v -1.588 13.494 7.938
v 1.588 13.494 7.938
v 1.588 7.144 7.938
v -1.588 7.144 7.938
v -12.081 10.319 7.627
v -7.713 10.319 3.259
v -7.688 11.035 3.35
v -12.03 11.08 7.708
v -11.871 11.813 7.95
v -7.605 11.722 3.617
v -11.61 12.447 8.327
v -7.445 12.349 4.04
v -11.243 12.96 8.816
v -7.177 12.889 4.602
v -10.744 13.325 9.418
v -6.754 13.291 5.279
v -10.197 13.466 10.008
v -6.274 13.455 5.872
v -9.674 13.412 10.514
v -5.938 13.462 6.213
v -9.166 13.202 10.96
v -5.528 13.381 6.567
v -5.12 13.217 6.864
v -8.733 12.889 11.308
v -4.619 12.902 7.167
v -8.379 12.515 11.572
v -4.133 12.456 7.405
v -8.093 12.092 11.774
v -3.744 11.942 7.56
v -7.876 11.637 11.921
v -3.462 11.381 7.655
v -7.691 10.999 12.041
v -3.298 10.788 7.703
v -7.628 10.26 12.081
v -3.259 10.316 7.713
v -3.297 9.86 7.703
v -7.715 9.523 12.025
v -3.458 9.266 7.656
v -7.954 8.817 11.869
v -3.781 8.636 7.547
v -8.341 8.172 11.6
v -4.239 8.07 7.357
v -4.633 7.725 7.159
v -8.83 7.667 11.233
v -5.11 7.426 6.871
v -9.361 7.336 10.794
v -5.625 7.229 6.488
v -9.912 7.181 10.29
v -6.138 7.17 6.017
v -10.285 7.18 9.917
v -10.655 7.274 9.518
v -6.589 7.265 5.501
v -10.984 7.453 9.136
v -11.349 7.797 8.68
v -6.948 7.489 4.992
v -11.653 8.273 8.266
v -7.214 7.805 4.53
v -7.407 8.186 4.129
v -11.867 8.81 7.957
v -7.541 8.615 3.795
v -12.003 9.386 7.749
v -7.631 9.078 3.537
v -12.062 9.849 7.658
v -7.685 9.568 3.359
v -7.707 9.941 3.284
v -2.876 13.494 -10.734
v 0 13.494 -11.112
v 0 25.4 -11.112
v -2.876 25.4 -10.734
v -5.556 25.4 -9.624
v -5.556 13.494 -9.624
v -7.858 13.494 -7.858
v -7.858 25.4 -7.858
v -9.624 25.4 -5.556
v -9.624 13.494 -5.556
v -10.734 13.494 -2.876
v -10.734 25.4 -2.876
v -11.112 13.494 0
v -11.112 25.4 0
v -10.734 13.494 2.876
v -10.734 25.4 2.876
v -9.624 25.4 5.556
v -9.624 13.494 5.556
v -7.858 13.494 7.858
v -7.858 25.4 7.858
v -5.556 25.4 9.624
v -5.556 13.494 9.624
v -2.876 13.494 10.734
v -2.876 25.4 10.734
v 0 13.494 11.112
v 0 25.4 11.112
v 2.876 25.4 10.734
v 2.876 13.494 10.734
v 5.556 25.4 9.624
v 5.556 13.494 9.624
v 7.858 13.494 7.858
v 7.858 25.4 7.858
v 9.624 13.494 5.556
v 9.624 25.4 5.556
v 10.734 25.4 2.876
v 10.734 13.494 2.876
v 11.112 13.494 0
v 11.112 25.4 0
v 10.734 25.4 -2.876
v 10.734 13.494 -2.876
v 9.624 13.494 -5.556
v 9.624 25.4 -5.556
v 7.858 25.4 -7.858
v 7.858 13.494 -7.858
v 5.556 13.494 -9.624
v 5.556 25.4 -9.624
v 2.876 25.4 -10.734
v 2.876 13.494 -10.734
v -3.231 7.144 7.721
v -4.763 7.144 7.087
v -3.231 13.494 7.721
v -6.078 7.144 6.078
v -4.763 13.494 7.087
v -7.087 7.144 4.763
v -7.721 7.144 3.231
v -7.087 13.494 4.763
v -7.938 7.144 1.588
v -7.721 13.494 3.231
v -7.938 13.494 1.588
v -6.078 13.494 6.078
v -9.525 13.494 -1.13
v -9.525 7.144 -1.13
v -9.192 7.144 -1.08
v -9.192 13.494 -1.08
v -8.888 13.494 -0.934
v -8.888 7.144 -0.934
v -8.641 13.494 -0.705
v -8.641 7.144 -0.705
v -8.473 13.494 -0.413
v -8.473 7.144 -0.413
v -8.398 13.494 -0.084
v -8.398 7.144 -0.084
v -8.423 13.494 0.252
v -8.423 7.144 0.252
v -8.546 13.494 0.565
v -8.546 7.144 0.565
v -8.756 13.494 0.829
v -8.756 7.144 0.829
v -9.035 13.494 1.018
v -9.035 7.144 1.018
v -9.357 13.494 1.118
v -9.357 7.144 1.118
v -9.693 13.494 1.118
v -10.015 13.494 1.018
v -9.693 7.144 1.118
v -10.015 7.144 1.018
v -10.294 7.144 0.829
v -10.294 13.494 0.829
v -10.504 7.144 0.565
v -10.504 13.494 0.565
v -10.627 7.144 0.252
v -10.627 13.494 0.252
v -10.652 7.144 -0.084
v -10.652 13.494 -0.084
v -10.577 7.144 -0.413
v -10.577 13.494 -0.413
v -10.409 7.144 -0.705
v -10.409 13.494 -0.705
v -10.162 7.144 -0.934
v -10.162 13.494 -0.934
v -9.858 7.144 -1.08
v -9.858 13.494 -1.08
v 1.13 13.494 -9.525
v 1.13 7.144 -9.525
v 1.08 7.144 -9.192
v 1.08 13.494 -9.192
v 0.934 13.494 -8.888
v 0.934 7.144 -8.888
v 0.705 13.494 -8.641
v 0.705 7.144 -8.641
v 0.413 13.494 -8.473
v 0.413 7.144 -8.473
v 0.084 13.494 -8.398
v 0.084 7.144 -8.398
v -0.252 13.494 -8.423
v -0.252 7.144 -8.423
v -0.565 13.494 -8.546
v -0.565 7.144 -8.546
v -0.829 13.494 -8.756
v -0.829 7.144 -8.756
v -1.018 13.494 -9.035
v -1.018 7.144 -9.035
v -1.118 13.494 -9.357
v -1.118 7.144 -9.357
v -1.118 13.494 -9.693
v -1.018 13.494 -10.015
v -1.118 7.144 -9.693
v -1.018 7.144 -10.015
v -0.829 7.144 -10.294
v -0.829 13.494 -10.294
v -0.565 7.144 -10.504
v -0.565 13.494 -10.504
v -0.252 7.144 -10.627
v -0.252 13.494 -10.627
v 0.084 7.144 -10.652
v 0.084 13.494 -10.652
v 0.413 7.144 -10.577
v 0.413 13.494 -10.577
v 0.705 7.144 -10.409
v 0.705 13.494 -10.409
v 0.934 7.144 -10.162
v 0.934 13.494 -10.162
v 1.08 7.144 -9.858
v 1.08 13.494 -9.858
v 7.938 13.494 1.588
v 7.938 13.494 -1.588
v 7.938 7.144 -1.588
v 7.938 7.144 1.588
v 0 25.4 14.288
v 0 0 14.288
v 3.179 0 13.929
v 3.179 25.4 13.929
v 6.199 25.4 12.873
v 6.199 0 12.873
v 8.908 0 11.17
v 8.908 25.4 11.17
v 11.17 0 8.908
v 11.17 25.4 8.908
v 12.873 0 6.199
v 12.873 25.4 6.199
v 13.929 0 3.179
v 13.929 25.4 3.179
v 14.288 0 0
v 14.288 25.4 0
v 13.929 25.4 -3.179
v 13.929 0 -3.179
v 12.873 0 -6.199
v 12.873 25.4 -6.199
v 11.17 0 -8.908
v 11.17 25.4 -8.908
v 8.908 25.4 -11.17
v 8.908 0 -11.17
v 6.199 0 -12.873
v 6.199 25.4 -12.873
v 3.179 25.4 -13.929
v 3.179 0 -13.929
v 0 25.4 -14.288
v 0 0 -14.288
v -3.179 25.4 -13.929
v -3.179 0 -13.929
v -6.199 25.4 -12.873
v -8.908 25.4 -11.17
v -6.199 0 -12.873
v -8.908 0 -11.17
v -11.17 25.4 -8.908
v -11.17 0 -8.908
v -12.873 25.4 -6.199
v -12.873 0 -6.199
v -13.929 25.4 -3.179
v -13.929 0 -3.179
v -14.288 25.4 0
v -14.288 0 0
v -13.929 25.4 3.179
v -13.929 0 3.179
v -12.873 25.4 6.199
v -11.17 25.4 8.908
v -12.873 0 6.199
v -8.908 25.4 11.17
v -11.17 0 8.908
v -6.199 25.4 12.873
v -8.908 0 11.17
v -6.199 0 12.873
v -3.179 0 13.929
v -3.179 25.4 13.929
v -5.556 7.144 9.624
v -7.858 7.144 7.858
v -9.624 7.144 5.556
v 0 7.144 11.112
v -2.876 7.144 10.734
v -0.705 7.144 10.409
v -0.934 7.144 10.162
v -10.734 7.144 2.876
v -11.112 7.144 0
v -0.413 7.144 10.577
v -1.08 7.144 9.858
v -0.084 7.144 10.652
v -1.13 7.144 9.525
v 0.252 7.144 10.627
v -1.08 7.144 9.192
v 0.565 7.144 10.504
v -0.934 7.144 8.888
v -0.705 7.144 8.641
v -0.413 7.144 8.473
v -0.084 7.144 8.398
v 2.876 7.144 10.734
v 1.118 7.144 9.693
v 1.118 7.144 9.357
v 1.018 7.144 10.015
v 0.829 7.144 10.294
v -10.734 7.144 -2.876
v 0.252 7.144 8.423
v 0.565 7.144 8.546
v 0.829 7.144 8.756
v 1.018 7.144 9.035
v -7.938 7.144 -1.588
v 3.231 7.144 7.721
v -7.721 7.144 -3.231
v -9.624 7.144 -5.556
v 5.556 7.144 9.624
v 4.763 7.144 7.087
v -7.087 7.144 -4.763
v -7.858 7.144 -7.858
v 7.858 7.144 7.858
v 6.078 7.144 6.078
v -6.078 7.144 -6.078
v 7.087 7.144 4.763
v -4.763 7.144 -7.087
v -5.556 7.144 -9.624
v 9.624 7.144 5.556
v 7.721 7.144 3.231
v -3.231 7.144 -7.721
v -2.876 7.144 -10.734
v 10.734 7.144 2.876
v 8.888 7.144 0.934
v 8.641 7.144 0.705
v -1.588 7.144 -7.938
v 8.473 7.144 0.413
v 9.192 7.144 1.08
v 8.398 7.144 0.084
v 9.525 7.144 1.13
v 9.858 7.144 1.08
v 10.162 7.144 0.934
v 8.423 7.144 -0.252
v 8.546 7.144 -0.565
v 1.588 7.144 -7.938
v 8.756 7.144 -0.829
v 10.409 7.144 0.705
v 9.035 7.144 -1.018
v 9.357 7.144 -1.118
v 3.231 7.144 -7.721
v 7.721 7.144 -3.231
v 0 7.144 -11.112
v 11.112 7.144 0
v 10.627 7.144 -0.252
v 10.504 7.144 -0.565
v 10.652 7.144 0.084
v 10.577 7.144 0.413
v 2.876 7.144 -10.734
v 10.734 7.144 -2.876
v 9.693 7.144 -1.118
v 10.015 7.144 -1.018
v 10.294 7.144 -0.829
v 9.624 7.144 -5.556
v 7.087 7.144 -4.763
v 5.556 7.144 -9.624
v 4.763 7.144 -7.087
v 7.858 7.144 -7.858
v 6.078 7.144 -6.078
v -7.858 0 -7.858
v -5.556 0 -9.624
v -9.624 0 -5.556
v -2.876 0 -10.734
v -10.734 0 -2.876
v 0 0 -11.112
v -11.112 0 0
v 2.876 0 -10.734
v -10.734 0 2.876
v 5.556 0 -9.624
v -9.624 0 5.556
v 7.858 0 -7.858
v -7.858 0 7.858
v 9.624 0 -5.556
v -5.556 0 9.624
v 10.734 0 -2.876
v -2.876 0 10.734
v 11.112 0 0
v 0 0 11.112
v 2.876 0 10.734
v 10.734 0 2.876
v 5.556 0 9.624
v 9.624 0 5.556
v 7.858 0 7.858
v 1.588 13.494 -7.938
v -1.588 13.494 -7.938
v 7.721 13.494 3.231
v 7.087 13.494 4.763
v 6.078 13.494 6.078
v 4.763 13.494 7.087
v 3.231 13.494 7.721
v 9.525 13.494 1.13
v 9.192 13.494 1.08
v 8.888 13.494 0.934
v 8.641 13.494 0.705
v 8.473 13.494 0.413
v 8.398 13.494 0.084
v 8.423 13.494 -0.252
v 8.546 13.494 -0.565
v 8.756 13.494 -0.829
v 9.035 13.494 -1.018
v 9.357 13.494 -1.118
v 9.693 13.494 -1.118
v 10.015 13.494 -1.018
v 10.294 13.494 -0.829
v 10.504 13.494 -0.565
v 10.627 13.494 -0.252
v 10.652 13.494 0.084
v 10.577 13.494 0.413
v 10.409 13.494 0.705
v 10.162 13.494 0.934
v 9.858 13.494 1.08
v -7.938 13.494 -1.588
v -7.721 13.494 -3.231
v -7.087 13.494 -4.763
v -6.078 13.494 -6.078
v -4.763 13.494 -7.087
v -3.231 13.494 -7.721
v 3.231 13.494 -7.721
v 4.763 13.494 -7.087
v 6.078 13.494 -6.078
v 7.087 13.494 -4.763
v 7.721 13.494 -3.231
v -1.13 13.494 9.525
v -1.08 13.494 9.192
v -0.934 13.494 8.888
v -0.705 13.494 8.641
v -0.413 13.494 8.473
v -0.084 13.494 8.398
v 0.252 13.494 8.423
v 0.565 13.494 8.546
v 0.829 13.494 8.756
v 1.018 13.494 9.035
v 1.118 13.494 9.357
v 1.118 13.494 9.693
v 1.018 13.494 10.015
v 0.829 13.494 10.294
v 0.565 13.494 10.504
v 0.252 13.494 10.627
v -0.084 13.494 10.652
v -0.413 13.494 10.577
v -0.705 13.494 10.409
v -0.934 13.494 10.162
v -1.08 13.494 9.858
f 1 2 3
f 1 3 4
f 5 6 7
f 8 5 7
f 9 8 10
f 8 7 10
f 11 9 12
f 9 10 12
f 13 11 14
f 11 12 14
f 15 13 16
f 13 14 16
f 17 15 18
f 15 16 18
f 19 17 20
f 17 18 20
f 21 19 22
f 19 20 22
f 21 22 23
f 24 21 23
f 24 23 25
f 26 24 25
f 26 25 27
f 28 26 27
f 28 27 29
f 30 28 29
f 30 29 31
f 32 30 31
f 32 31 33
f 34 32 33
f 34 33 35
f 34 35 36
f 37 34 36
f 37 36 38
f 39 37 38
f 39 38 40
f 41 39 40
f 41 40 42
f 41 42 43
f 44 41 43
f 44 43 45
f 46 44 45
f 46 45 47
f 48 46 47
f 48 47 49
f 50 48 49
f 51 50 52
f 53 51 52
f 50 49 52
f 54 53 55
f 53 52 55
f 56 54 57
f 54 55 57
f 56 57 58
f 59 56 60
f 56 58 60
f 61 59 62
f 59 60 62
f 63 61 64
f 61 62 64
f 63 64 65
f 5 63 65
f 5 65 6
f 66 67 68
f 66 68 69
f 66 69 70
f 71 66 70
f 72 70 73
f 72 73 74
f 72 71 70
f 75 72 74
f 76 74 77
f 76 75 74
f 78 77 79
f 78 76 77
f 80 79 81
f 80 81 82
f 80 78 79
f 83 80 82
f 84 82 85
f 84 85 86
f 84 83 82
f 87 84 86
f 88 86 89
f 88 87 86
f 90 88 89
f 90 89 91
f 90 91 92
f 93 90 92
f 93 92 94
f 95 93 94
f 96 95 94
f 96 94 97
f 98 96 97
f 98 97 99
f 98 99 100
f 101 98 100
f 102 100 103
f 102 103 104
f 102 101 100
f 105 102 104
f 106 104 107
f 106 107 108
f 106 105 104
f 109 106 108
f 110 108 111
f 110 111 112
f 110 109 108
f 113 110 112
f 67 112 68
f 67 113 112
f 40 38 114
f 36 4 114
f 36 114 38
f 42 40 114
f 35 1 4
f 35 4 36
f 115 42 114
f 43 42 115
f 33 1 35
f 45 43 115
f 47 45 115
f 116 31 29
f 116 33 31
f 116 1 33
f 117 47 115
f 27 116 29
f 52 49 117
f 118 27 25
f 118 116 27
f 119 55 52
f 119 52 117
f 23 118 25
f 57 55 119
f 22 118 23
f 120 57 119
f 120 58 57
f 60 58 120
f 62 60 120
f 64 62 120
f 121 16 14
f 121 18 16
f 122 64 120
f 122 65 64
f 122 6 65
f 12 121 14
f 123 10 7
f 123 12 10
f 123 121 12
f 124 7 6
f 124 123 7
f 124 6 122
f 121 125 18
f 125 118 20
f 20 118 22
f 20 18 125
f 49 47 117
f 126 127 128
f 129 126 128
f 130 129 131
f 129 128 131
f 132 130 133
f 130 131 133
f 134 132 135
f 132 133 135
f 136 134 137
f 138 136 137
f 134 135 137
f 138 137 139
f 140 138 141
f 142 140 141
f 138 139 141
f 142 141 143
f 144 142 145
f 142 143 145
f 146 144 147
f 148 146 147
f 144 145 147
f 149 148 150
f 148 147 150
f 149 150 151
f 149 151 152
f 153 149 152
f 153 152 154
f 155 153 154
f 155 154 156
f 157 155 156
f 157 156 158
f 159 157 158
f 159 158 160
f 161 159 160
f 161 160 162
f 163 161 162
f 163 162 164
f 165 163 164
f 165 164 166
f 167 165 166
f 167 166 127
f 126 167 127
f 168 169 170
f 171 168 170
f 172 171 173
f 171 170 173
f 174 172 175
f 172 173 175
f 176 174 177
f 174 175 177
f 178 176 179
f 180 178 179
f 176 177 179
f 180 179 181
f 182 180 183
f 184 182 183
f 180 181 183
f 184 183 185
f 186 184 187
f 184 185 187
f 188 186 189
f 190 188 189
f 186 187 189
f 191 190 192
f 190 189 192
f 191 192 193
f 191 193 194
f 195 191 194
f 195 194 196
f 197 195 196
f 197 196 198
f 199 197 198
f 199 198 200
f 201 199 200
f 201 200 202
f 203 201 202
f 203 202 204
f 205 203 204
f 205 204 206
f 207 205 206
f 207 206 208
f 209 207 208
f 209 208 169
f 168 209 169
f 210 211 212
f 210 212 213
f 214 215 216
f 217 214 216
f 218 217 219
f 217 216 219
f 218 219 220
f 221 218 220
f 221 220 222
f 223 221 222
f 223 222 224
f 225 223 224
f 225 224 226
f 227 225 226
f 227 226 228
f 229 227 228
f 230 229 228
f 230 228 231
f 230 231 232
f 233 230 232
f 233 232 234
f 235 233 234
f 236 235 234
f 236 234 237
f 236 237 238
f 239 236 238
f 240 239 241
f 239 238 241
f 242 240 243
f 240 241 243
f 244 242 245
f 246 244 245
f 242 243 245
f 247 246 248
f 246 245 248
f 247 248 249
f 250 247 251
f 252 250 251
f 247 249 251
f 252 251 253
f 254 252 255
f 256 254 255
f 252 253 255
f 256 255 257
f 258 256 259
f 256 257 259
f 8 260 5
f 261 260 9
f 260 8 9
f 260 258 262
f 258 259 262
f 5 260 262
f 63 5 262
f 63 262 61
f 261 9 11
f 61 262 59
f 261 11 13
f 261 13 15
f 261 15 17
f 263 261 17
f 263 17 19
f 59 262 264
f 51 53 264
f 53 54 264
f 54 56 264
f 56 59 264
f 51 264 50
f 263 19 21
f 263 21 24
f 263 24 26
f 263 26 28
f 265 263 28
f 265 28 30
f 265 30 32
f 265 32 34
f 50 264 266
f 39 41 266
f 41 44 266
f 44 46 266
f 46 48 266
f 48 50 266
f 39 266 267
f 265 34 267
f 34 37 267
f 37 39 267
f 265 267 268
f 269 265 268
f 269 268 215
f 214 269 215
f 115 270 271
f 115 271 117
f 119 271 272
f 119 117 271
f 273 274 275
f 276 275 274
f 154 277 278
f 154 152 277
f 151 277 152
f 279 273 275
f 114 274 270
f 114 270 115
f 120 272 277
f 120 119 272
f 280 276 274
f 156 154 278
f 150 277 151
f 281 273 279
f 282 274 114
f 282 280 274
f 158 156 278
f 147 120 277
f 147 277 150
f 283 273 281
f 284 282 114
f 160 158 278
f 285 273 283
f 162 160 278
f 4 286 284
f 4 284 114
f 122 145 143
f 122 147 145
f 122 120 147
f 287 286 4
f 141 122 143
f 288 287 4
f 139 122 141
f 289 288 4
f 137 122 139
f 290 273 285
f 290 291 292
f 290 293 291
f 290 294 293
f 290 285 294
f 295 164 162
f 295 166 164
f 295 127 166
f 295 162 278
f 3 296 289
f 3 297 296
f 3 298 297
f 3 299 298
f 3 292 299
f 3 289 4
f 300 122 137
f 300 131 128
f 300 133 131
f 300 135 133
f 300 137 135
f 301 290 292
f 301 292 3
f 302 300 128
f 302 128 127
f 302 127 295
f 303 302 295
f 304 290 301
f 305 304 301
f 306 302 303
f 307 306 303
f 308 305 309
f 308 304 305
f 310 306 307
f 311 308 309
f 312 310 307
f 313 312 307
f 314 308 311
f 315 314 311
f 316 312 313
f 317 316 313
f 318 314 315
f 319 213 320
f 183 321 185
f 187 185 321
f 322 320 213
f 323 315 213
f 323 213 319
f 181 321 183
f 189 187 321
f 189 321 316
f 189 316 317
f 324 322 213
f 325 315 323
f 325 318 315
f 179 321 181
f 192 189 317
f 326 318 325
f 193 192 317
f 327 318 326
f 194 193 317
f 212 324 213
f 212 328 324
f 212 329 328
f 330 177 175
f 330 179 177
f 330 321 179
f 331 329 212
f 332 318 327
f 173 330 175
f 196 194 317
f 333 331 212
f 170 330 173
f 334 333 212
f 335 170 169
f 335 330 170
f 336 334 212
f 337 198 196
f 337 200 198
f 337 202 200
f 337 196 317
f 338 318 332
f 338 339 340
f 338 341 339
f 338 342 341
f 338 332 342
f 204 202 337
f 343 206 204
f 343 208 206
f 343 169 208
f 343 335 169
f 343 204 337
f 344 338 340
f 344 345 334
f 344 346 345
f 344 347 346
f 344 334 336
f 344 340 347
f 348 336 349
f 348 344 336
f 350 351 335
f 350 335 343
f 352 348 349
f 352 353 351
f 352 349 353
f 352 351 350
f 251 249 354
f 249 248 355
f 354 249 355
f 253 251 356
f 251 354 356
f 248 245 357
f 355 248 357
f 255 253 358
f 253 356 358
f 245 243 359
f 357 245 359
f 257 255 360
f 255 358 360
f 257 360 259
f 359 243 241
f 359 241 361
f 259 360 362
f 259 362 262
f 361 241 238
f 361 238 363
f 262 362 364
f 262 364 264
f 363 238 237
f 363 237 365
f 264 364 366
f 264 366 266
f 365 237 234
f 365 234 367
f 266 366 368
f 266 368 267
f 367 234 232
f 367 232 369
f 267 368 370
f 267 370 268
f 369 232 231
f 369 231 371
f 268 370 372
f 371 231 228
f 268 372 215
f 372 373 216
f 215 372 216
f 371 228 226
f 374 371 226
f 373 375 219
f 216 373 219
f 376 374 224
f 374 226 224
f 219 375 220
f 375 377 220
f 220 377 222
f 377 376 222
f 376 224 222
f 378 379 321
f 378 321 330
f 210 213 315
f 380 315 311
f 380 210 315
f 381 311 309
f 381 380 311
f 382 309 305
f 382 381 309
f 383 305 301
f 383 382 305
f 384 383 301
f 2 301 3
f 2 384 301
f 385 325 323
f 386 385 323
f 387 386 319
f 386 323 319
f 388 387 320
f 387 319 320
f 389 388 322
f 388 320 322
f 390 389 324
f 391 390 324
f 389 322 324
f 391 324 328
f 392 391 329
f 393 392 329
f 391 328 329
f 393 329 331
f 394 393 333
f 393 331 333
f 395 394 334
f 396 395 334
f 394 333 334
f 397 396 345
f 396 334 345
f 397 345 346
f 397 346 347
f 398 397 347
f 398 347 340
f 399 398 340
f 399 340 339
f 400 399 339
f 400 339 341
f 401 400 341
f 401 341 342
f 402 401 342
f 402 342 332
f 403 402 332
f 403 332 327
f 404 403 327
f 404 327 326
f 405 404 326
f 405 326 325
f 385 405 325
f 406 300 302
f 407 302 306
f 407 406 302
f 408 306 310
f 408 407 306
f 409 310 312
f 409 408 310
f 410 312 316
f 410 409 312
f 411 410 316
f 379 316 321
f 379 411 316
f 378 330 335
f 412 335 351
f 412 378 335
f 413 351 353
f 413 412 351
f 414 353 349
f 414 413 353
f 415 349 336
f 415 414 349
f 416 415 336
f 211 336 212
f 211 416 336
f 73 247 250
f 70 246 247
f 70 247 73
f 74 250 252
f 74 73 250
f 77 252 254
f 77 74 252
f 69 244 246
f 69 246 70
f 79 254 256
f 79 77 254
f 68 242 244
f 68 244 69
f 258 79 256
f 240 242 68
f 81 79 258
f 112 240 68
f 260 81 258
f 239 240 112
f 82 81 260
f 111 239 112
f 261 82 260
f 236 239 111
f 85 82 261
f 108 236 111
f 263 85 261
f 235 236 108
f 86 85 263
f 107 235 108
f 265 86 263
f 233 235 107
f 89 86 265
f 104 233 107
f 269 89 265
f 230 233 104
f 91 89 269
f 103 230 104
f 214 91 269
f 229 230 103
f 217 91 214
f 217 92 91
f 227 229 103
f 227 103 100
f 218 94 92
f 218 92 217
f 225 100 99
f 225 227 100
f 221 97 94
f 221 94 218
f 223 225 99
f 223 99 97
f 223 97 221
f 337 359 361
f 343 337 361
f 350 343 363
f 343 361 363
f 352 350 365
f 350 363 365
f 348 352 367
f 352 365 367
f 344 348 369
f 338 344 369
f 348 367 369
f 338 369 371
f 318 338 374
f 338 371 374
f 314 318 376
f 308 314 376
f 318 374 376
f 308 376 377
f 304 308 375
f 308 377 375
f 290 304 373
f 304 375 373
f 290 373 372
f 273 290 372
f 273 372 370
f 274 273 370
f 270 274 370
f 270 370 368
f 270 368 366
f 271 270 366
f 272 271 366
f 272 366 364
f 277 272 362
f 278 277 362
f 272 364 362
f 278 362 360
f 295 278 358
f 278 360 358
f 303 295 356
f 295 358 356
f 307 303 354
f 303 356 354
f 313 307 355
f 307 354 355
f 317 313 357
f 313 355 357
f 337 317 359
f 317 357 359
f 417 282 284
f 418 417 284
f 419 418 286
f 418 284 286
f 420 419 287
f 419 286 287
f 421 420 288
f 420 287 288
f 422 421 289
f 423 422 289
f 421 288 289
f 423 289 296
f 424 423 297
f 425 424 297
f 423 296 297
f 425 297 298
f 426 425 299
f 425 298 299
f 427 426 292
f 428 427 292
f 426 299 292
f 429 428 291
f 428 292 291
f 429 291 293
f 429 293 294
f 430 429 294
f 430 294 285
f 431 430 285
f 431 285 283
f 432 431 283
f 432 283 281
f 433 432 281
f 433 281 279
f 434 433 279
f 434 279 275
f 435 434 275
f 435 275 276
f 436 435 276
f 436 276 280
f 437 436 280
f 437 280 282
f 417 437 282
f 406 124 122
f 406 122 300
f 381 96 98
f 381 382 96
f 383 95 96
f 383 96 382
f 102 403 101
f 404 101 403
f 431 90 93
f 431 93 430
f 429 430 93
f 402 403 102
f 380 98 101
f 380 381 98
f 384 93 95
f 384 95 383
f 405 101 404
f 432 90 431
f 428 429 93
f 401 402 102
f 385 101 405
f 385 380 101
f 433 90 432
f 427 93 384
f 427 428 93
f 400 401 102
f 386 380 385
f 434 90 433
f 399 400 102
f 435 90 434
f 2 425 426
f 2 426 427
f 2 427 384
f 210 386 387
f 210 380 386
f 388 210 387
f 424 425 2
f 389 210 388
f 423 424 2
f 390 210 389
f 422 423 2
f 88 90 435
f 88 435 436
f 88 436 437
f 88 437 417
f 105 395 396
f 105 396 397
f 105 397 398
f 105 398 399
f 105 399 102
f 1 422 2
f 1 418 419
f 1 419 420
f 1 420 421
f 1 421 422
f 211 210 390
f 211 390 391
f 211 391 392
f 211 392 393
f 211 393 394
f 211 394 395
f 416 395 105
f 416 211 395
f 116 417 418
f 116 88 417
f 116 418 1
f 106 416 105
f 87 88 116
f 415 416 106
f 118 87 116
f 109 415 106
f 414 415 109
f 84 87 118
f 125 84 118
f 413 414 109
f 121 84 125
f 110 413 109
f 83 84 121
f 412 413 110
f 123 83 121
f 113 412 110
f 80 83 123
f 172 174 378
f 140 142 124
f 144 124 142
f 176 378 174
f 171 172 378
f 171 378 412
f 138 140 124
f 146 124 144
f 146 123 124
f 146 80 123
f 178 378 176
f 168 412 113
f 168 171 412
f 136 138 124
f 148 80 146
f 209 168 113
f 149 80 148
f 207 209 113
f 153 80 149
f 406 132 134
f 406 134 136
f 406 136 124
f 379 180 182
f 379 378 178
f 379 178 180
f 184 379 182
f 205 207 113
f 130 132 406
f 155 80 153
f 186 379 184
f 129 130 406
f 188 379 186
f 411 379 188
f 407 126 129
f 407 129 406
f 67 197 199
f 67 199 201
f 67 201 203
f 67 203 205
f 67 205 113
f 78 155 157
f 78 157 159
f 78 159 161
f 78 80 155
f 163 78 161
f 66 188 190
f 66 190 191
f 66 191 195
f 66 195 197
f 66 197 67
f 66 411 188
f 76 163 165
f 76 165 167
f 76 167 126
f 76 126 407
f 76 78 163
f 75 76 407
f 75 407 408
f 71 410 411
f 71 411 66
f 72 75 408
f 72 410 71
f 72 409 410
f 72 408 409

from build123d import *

# Parameters (mm, degrees)
SKETCH1_R             = 14.2875
BOSS_EXTRUDE1_DEPTH   = 25.4
SKETCH3_R             = 11.1125
CUT_EXTRUDE1_DEPTH    = 7.14375
CUT_EXTRUDE2_DEPTH    = 18.25625
CUT_EXTRUDE3_START    = -11.90625
SKETCH5_R             = 11.1125
CUT_EXTRUDE3_DEPTH    = 11.90625
F_4_40_TAPPED_HOLE1_D = 2.2606
CIRPATTERN1_COUNT     = 4
SKETCH8_R             = 3.1496
CUT_EXTRUDE6_DEPTH    = 33.456514177


with BuildPart() as part:
    # Sketch1 → Boss-Extrude1 (new body)
    with BuildSketch(Plane(origin=(0, 0, 0), x_dir=(1, 0, 0), z_dir=(0, 1, 0))):
        Circle(SKETCH1_R)
    extrude(amount=BOSS_EXTRUDE1_DEPTH)

    # Sketch3 → Cut-Extrude1 (cut)
    with BuildSketch(Plane.XZ):
        Circle(SKETCH3_R)
    extrude(amount=-CUT_EXTRUDE1_DEPTH, mode=Mode.SUBTRACT)

    # Sketch4 → Cut-Extrude2 (cut)
    with BuildSketch(Plane(origin=(0, 25.4, 0), x_dir=(1, 0, 0), z_dir=(0, 1, 0))):
        with BuildLine():
            Line((-1.5875, 7.9375), (1.5875, 7.9375))
            ThreePointArc((1.5875, 7.9375), (6.077628061, 6.077628061), (7.9375, 1.5875))
            Line((7.9375, 1.5875), (7.9375, -1.5875))
            ThreePointArc((7.9375, -1.5875), (6.077628061, -6.077628061), (1.5875, -7.9375))
            Line((1.5875, -7.9375), (-1.5875, -7.9375))
            ThreePointArc((-1.5875, -7.9375), (-6.077628061, -6.077628061), (-7.9375, -1.5875))
            Line((-7.9375, -1.5875), (-7.9375, 1.5875))
            ThreePointArc((-7.9375, 1.5875), (-6.077628061, 6.077628061), (-1.5875, 7.9375))
        make_face()
    extrude(amount=-CUT_EXTRUDE2_DEPTH, mode=Mode.SUBTRACT)

    # Sketch5 → Cut-Extrude3 (cut)
    with BuildSketch(Plane(origin=(0, 25.4, 0), x_dir=(1, 0, 0), z_dir=(0, 1, 0)).offset(CUT_EXTRUDE3_START)):
        Circle(SKETCH5_R)
    extrude(amount=CUT_EXTRUDE3_DEPTH, mode=Mode.SUBTRACT)

    # #4-40 Tapped Hole1 (through all)
    with Locations(Plane(origin=(0, 13.49375, 0), x_dir=(-1, 0, 0), z_dir=(0, 1, 0))):
        with Locations((0, -9.525)):
            f_4_40_tapped_hole1 = Hole(F_4_40_TAPPED_HOLE1_D / 2)

    # CirPattern1: #4-40 Tapped Hole1 ×4 about axis
    cirpattern1_axis = Axis((0, 25.4, 0), (0, 1, 0))
    for i in range(1, CIRPATTERN1_COUNT):
        add(f_4_40_tapped_hole1.rotate(cirpattern1_axis, i * 360 / CIRPATTERN1_COUNT), mode=Mode.SUBTRACT)

    # Sketch8 → Cut-Extrude6 (cut, through all)
    with BuildSketch(Plane(origin=(0, 0, 0), x_dir=(-0.7071067811865488, 0, -0.7071067811865464), z_dir=(0.7071067811865464, 0, -0.7071067811865488))):
        with Locations((0, 10.31875)):
            Circle(SKETCH8_R)
    extrude(amount=-CUT_EXTRUDE6_DEPTH, mode=Mode.SUBTRACT)


solid = part.part
